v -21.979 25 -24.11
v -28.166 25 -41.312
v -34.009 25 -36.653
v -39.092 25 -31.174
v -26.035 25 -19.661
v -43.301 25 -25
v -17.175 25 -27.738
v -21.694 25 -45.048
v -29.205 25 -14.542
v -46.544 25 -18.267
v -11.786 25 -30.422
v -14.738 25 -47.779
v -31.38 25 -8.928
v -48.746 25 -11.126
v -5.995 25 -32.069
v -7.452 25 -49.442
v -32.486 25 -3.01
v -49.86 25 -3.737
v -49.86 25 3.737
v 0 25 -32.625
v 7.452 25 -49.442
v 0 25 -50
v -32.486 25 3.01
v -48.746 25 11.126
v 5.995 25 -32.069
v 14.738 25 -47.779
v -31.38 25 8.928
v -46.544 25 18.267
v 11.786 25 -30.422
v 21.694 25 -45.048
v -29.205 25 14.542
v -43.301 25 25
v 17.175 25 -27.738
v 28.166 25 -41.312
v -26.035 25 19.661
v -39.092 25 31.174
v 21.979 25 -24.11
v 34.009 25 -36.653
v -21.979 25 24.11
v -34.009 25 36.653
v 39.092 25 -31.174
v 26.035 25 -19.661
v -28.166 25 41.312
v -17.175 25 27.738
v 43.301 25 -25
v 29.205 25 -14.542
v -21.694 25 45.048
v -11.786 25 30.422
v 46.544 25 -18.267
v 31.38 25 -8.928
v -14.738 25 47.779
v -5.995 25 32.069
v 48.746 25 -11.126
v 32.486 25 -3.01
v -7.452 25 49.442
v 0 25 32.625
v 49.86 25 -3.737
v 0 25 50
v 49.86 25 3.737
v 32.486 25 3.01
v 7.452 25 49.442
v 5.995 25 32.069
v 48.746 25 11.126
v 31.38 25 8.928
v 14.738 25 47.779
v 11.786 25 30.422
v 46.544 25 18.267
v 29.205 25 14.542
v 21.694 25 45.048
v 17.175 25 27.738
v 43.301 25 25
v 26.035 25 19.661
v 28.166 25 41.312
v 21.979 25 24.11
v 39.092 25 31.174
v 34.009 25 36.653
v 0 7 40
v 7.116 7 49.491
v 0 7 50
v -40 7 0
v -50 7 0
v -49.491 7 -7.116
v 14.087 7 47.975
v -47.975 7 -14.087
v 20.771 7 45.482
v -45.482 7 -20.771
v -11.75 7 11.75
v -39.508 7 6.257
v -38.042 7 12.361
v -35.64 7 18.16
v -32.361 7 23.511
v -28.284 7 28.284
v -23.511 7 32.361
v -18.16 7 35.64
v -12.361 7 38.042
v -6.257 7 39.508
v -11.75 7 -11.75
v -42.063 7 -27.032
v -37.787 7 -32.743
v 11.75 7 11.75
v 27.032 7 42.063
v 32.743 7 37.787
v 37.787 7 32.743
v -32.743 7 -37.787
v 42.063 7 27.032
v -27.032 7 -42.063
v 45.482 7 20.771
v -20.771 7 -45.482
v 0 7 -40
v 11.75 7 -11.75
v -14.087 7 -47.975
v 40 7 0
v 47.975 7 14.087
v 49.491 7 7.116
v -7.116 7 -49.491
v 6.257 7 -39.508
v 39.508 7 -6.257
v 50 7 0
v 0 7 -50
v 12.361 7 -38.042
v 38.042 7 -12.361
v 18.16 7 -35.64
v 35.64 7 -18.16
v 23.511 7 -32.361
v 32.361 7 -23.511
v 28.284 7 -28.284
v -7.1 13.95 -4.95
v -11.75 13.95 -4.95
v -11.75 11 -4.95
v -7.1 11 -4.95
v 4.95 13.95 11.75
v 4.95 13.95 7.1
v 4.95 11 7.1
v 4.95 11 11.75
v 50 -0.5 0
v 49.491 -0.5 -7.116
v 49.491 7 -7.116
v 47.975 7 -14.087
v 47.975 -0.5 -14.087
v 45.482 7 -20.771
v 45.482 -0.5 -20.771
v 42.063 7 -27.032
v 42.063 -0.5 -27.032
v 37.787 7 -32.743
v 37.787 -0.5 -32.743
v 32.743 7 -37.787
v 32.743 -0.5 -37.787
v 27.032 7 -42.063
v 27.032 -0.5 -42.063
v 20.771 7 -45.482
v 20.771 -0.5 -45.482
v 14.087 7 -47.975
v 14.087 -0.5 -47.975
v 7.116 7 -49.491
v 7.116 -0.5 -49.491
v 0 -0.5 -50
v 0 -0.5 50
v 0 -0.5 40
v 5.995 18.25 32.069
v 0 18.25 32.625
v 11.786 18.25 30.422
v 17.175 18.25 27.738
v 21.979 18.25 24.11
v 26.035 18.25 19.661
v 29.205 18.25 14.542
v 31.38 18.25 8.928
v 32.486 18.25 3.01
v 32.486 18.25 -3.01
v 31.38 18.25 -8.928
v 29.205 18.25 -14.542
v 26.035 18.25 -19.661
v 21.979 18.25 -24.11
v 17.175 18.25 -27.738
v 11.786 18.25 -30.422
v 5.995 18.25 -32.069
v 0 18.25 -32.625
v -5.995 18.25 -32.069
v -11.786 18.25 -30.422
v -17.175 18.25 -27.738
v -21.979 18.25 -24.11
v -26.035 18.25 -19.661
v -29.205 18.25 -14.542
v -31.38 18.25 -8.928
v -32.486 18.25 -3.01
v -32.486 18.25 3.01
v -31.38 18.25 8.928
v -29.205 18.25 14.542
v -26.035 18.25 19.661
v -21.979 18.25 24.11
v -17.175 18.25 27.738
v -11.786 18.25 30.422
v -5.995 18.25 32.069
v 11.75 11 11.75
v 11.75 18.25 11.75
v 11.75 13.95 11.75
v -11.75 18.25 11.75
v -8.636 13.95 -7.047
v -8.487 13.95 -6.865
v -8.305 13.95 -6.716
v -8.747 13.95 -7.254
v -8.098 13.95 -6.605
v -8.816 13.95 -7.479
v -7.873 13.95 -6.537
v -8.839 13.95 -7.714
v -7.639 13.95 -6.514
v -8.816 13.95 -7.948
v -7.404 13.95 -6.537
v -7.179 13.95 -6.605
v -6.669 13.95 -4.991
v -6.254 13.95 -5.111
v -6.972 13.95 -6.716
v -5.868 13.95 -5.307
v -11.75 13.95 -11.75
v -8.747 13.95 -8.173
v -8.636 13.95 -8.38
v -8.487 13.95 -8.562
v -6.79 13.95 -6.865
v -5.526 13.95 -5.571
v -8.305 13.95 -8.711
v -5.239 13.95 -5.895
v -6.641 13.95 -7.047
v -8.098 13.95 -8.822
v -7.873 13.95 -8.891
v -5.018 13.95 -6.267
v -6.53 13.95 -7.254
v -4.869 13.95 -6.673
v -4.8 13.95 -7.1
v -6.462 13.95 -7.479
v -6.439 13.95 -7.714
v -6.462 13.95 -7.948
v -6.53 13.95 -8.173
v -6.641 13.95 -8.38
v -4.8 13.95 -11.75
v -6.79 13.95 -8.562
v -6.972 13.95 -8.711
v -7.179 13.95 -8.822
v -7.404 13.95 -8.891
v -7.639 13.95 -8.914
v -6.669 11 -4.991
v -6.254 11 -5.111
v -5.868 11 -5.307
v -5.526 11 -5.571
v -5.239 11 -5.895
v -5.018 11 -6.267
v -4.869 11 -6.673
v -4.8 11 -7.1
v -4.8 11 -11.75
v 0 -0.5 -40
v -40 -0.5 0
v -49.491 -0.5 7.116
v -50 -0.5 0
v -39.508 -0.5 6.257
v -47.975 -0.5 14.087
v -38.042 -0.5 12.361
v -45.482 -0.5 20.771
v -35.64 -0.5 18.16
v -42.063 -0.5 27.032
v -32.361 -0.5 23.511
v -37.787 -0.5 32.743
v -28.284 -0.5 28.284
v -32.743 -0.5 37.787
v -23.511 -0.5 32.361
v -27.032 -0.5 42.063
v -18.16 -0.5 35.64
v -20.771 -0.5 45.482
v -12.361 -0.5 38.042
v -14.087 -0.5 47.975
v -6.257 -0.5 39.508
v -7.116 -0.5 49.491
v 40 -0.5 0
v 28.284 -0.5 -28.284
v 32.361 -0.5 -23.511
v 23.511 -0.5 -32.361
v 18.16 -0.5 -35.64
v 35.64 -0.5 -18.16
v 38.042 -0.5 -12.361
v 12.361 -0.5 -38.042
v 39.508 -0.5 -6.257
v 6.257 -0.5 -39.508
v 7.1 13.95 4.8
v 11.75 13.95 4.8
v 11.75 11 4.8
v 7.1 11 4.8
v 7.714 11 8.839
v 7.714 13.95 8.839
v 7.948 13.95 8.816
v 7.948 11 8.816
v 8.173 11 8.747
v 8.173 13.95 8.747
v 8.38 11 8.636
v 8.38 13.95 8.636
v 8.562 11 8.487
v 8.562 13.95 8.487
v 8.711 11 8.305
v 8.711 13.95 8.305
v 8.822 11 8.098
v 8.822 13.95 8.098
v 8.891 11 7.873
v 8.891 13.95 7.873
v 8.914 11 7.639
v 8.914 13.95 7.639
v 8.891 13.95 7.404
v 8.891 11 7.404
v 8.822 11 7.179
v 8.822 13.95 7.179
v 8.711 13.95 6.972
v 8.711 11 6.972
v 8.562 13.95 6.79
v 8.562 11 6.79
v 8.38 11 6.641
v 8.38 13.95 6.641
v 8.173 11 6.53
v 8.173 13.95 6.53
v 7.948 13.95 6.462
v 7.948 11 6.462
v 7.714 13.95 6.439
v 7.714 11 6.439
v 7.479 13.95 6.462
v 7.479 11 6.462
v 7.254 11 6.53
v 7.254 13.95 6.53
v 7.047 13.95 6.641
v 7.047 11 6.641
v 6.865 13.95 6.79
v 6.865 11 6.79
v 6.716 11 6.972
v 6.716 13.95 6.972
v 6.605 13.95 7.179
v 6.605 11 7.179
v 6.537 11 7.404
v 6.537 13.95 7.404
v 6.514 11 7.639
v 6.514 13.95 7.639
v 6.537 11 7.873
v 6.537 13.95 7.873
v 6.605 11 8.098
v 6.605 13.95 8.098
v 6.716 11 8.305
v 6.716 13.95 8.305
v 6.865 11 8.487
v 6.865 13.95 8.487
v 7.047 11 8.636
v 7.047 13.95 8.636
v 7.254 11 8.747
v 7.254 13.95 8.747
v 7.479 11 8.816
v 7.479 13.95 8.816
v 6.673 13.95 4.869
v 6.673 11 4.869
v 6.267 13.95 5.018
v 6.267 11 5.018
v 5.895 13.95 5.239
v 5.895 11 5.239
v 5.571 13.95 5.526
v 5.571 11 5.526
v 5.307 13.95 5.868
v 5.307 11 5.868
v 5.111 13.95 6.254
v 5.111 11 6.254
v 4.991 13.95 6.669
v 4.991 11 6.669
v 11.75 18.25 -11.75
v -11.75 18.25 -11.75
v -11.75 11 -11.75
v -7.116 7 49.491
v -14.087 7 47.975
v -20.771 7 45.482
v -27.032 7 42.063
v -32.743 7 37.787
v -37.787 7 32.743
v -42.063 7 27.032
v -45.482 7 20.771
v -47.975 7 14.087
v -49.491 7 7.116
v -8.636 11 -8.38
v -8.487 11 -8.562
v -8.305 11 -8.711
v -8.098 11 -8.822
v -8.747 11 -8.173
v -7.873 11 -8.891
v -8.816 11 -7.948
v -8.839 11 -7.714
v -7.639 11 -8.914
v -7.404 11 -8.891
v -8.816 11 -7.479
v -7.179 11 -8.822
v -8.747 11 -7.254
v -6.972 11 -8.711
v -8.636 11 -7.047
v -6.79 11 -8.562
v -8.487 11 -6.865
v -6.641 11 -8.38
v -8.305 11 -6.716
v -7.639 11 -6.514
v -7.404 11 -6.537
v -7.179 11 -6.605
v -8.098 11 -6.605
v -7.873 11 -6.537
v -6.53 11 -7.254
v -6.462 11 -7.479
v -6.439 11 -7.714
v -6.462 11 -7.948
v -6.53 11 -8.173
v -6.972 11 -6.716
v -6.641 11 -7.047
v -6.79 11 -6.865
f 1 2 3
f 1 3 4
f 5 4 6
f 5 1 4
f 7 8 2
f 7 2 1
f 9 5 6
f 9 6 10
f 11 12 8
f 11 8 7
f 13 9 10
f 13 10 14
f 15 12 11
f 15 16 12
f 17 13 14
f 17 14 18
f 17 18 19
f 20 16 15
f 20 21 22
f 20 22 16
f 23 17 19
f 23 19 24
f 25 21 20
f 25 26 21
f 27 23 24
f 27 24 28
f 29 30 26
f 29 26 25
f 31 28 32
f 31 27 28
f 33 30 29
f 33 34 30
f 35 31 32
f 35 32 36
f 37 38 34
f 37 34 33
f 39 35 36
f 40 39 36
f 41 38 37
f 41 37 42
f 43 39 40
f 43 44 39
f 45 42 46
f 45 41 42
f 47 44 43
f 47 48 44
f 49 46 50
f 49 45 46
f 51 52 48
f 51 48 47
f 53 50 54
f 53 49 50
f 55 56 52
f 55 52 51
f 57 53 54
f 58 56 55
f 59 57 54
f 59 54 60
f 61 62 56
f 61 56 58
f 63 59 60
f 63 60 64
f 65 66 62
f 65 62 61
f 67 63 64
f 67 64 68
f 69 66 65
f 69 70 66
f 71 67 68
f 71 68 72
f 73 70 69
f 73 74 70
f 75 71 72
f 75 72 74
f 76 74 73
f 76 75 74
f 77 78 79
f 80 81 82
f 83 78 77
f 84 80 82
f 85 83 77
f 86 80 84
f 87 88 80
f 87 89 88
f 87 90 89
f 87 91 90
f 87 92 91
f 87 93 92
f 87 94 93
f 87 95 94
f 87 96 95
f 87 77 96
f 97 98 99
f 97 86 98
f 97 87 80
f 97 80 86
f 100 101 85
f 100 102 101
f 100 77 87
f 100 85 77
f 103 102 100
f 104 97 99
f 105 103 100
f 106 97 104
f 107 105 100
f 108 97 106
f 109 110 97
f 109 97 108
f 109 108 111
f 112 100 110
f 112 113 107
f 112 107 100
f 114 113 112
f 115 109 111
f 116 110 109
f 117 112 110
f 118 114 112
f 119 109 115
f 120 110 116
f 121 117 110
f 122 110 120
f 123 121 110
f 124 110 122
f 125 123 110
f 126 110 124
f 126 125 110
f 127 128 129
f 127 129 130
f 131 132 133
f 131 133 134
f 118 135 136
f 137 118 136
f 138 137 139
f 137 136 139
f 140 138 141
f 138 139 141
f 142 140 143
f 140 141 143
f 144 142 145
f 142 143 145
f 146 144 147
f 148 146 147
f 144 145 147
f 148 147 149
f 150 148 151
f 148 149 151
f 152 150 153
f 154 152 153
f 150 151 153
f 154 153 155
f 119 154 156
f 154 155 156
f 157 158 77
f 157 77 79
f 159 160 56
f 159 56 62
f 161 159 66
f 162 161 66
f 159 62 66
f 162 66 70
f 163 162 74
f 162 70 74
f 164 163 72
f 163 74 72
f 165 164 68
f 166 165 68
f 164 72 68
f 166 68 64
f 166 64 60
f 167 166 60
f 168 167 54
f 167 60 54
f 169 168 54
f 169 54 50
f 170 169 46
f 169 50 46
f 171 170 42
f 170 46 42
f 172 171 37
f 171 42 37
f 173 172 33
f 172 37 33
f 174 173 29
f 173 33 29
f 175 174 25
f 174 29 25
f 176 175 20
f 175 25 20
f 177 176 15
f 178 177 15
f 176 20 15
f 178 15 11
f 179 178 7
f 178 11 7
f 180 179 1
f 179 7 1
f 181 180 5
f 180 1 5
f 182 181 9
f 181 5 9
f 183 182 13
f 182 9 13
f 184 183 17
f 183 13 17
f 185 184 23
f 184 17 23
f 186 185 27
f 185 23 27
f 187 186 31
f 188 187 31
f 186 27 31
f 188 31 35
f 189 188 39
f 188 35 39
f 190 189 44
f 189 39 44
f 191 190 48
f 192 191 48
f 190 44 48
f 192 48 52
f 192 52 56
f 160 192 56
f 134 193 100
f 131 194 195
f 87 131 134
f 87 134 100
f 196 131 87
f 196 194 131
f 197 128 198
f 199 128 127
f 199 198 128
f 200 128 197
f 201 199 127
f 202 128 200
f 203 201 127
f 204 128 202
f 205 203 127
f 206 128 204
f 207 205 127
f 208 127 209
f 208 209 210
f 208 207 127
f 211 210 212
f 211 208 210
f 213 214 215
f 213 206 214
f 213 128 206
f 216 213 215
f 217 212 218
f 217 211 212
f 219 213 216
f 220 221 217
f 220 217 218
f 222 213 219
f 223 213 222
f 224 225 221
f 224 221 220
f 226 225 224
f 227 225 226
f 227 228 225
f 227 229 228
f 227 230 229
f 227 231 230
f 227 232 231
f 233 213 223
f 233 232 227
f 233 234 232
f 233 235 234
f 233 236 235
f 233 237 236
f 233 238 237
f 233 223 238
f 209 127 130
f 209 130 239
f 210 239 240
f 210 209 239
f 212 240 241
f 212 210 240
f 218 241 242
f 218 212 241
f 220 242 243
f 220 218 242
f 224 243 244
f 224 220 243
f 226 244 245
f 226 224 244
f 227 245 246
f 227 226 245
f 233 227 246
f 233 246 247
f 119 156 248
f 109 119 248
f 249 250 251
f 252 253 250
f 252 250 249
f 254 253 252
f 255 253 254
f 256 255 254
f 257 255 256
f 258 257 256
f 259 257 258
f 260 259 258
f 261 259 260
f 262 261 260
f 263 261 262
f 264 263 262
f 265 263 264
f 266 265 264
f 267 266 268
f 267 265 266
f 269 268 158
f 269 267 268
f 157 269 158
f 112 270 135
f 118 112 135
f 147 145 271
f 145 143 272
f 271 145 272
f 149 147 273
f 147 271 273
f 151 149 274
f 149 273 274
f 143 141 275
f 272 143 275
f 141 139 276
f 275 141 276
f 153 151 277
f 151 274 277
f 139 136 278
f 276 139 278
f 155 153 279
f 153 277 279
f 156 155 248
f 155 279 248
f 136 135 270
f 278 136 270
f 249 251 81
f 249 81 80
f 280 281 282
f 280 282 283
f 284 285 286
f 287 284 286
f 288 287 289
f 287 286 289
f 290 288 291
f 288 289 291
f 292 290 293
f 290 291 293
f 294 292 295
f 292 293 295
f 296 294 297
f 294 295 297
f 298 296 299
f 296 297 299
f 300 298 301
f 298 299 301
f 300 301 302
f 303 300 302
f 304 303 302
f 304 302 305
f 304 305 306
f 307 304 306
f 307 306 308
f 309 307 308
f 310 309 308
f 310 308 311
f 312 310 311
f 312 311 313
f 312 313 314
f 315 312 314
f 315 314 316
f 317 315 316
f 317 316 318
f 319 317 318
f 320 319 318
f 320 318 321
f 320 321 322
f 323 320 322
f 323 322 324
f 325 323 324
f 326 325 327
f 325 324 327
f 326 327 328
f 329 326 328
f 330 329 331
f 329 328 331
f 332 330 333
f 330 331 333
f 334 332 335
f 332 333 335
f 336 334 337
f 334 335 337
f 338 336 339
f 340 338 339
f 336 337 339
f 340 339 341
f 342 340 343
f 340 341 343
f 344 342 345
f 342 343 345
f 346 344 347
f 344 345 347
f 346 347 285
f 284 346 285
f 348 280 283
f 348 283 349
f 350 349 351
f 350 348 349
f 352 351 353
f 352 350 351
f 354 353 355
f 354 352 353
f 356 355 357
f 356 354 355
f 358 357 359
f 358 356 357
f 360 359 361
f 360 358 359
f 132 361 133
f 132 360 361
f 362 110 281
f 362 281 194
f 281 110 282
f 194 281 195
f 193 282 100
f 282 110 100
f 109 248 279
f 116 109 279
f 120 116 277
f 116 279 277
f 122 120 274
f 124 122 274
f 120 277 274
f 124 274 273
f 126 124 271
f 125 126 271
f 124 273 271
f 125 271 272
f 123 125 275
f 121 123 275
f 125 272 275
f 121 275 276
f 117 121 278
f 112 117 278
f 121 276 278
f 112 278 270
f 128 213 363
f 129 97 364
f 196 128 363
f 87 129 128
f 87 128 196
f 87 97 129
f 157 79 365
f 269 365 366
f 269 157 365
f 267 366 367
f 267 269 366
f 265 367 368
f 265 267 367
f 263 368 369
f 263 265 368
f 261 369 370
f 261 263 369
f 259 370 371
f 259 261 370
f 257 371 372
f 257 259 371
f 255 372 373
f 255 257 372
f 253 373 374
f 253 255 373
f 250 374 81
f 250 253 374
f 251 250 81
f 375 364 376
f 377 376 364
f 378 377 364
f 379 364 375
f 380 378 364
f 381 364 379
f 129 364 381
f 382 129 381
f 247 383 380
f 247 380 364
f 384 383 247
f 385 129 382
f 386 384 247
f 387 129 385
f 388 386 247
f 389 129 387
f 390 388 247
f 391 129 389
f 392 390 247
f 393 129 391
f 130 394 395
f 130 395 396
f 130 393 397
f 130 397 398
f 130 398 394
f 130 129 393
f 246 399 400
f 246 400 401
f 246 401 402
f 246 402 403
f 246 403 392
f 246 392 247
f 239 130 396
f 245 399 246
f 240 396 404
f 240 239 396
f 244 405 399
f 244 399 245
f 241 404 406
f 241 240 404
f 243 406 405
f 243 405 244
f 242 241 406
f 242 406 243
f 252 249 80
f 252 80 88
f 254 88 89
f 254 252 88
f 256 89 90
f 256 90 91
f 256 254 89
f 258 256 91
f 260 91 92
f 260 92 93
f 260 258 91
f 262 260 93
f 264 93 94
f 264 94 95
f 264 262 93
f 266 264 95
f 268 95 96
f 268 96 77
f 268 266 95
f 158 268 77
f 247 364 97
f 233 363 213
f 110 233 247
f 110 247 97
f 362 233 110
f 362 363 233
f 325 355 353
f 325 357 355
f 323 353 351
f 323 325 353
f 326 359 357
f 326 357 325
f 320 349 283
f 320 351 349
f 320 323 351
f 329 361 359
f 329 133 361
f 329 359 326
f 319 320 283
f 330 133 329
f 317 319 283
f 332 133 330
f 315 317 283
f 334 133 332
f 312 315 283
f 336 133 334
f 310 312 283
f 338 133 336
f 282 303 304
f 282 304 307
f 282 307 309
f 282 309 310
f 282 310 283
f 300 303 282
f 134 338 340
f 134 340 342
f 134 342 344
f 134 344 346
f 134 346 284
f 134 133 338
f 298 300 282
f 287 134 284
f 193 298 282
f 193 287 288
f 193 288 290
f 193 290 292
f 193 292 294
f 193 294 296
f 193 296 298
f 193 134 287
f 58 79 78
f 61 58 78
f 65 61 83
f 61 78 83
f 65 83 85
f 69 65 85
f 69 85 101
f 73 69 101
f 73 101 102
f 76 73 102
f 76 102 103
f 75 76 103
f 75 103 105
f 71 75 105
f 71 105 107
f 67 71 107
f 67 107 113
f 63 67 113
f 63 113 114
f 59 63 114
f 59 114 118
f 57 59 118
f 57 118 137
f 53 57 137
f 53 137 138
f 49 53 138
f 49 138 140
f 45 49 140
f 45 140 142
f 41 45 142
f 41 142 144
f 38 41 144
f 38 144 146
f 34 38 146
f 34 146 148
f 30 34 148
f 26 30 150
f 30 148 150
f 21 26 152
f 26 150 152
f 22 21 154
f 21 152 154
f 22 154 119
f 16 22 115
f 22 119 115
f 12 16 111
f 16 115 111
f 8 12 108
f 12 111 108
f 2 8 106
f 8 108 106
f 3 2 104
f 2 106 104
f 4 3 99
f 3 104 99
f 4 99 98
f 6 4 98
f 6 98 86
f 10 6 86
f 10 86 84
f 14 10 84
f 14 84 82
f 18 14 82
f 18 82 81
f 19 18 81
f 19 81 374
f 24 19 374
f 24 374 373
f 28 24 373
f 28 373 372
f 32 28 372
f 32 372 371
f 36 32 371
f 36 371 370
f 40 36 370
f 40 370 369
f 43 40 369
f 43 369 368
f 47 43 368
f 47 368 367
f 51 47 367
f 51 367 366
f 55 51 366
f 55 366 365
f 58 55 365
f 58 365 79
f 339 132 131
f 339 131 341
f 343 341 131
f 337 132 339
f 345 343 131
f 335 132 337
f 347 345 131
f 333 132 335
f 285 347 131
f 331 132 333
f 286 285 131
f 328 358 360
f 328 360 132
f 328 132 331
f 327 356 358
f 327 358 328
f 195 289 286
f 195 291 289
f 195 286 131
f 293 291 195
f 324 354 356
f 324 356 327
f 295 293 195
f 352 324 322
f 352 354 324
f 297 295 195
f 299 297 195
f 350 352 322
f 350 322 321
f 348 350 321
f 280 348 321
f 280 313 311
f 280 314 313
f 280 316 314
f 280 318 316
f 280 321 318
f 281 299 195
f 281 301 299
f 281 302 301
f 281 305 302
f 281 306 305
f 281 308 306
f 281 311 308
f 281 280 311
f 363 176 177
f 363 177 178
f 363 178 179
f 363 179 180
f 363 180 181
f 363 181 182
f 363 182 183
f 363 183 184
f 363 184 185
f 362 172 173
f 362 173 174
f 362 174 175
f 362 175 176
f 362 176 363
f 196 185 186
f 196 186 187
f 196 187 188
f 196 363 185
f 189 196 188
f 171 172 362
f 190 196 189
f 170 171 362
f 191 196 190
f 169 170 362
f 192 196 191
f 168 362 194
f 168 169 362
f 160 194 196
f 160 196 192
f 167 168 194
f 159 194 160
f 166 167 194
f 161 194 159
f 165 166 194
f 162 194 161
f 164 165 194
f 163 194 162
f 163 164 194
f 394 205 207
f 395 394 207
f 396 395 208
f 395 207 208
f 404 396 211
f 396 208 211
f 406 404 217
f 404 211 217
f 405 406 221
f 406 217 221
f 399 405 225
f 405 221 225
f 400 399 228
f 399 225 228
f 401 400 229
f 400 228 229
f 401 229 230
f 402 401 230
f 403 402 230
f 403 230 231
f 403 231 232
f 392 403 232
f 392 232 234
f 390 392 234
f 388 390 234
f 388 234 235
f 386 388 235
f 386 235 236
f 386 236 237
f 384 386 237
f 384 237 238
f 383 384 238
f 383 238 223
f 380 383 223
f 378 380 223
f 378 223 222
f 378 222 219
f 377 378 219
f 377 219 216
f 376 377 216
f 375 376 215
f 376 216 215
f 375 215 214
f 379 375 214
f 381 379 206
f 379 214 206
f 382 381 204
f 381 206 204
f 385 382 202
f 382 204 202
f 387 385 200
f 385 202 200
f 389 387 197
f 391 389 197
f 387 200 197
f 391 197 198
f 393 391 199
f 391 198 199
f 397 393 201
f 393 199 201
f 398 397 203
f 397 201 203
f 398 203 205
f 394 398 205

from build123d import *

# Parameters (mm, degrees)
SKETCH1_R           = 50
BOSS_EXTRUDE1_DEPTH = 25
SKETCH2_R           = 32.625
CUT_EXTRUDE1_DEPTH  = 6.75
SKETCH3_W           = 23.5
SKETCH3_H           = 23.5
CUT_EXTRUDE2_DEPTH  = 4.3
CUT_EXTRUDE3_DEPTH  = 13.95
SKETCH24_W          = 23.5
SKETCH24_H          = 23.5
CUT_EXTRUDE4_DEPTH  = 11
SKETCH25_R          = 50
CUT_EXTRUDE5_DEPTH  = 7
SKETCH26_R          = 1.2
CUT_EXTRUDE6_DEPTH  = 72.568865437
BOSS_EXTRUDE2_START = 7.5
BOSS_EXTRUDE2_DEPTH = 7.5


with BuildPart() as part:
    # Sketch1 → Boss-Extrude1 (new body)
    with BuildSketch(Plane(origin=(0, 0, 0), x_dir=(1, 0, 0), z_dir=(0, 1, 0))):
        with Locations(Location((0, 0, 0), (0, 0, 270))):
            Circle(SKETCH1_R)
    extrude(amount=BOSS_EXTRUDE1_DEPTH)

    # Sketch2 → Cut-Extrude1 (cut)
    with BuildSketch(Plane(origin=(0, 25, 0), x_dir=(1, 0, 0), z_dir=(0, 1, 0))):
        with Locations(Location((0, 0, 0), (0, 0, 270))):
            Circle(SKETCH2_R)
    extrude(amount=-CUT_EXTRUDE1_DEPTH, mode=Mode.SUBTRACT)

    # Sketch3 → Cut-Extrude2 (cut)
    with BuildSketch(Plane(origin=(0, 18.25, 0), x_dir=(1, 0, 0), z_dir=(0, 1, 0))):
        Rectangle(SKETCH3_W, SKETCH3_H)
    extrude(amount=-CUT_EXTRUDE2_DEPTH, mode=Mode.SUBTRACT)

    # Sketch4 → Cut-Extrude3 (cut)
    with BuildSketch(Plane(origin=(0, 13.95, 0), x_dir=(1, 0, 0), z_dir=(0, 1, 0))):
        with BuildLine():
            Line((-11.75, 4.95), (-7.1, 4.95))
            ThreePointArc((-7.1, 4.95), (-5.525793851, 5.571198073), (-4.8, 7.1))
            Line((-4.8, 7.1), (-4.8, 11.75))
            Line((-4.8, 11.75), (11.75, 11.75))
            Line((11.75, 11.75), (11.75, -4.8))
            Line((11.75, -4.8), (7.1, -4.8))
            ThreePointArc((7.1, -4.8), (5.571198073, -5.525793851), (4.95, -7.1))
            Line((4.95, -7.1), (4.95, -11.75))
            Line((4.95, -11.75), (-11.75, -11.75))
            Line((-11.75, -11.75), (-11.75, 4.95))
        make_face()
    extrude(amount=-CUT_EXTRUDE3_DEPTH, mode=Mode.SUBTRACT)

    # Sketch24 → Cut-Extrude4 (cut)
    with BuildSketch(Plane.XZ):
        Rectangle(SKETCH24_W, SKETCH24_H)
    extrude(amount=-CUT_EXTRUDE4_DEPTH, mode=Mode.SUBTRACT)

    # Sketch25 → Cut-Extrude5 (cut)
    with BuildSketch(Plane.XZ):
        with Locations(Location((0, 0, 0), (0, 0, 270))):
            Circle(SKETCH25_R)
    extrude(amount=-CUT_EXTRUDE5_DEPTH, mode=Mode.SUBTRACT)

    # Sketch26 → Cut-Extrude6 (cut, through all)
    with BuildSketch(Plane(origin=(0, 13.95, 0), x_dir=(1, 0, 0), z_dir=(0, 1, 0))):
        with Locations(Location((-7.638603897, 7.713603897, 0), (0, 0, 270))):
            Circle(SKETCH26_R)
        with Locations(Location((7.713603897, -7.638603897, 0), (0, 0, 270))):
            Circle(SKETCH26_R)
    extrude(amount=-CUT_EXTRUDE6_DEPTH, mode=Mode.SUBTRACT)

    # Sketch27 → Boss-Extrude2 (add)
    with BuildSketch(Plane.XZ.offset(-7).offset(BOSS_EXTRUDE2_START)):
        with BuildLine():
            Line((-50, 0), (-40, 0))
            ThreePointArc((-40, 0), (-28.284271247, 28.284271247), (0, 40))
            Line((0, 40), (0, 50))
            ThreePointArc((0, 50), (-35.355339059, 35.355339059), (-50, 0))
        make_face()
        with BuildLine():
            Line((40, 0), (50, 0))
            ThreePointArc((50, 0), (35.355339059, -35.355339059), (0, -50))
            Line((0, -50), (0, -40))
            ThreePointArc((0, -40), (28.284271247, -28.284271247), (40, 0))
        make_face()
    extrude(amount=-BOSS_EXTRUDE2_DEPTH)


solid = part.part
